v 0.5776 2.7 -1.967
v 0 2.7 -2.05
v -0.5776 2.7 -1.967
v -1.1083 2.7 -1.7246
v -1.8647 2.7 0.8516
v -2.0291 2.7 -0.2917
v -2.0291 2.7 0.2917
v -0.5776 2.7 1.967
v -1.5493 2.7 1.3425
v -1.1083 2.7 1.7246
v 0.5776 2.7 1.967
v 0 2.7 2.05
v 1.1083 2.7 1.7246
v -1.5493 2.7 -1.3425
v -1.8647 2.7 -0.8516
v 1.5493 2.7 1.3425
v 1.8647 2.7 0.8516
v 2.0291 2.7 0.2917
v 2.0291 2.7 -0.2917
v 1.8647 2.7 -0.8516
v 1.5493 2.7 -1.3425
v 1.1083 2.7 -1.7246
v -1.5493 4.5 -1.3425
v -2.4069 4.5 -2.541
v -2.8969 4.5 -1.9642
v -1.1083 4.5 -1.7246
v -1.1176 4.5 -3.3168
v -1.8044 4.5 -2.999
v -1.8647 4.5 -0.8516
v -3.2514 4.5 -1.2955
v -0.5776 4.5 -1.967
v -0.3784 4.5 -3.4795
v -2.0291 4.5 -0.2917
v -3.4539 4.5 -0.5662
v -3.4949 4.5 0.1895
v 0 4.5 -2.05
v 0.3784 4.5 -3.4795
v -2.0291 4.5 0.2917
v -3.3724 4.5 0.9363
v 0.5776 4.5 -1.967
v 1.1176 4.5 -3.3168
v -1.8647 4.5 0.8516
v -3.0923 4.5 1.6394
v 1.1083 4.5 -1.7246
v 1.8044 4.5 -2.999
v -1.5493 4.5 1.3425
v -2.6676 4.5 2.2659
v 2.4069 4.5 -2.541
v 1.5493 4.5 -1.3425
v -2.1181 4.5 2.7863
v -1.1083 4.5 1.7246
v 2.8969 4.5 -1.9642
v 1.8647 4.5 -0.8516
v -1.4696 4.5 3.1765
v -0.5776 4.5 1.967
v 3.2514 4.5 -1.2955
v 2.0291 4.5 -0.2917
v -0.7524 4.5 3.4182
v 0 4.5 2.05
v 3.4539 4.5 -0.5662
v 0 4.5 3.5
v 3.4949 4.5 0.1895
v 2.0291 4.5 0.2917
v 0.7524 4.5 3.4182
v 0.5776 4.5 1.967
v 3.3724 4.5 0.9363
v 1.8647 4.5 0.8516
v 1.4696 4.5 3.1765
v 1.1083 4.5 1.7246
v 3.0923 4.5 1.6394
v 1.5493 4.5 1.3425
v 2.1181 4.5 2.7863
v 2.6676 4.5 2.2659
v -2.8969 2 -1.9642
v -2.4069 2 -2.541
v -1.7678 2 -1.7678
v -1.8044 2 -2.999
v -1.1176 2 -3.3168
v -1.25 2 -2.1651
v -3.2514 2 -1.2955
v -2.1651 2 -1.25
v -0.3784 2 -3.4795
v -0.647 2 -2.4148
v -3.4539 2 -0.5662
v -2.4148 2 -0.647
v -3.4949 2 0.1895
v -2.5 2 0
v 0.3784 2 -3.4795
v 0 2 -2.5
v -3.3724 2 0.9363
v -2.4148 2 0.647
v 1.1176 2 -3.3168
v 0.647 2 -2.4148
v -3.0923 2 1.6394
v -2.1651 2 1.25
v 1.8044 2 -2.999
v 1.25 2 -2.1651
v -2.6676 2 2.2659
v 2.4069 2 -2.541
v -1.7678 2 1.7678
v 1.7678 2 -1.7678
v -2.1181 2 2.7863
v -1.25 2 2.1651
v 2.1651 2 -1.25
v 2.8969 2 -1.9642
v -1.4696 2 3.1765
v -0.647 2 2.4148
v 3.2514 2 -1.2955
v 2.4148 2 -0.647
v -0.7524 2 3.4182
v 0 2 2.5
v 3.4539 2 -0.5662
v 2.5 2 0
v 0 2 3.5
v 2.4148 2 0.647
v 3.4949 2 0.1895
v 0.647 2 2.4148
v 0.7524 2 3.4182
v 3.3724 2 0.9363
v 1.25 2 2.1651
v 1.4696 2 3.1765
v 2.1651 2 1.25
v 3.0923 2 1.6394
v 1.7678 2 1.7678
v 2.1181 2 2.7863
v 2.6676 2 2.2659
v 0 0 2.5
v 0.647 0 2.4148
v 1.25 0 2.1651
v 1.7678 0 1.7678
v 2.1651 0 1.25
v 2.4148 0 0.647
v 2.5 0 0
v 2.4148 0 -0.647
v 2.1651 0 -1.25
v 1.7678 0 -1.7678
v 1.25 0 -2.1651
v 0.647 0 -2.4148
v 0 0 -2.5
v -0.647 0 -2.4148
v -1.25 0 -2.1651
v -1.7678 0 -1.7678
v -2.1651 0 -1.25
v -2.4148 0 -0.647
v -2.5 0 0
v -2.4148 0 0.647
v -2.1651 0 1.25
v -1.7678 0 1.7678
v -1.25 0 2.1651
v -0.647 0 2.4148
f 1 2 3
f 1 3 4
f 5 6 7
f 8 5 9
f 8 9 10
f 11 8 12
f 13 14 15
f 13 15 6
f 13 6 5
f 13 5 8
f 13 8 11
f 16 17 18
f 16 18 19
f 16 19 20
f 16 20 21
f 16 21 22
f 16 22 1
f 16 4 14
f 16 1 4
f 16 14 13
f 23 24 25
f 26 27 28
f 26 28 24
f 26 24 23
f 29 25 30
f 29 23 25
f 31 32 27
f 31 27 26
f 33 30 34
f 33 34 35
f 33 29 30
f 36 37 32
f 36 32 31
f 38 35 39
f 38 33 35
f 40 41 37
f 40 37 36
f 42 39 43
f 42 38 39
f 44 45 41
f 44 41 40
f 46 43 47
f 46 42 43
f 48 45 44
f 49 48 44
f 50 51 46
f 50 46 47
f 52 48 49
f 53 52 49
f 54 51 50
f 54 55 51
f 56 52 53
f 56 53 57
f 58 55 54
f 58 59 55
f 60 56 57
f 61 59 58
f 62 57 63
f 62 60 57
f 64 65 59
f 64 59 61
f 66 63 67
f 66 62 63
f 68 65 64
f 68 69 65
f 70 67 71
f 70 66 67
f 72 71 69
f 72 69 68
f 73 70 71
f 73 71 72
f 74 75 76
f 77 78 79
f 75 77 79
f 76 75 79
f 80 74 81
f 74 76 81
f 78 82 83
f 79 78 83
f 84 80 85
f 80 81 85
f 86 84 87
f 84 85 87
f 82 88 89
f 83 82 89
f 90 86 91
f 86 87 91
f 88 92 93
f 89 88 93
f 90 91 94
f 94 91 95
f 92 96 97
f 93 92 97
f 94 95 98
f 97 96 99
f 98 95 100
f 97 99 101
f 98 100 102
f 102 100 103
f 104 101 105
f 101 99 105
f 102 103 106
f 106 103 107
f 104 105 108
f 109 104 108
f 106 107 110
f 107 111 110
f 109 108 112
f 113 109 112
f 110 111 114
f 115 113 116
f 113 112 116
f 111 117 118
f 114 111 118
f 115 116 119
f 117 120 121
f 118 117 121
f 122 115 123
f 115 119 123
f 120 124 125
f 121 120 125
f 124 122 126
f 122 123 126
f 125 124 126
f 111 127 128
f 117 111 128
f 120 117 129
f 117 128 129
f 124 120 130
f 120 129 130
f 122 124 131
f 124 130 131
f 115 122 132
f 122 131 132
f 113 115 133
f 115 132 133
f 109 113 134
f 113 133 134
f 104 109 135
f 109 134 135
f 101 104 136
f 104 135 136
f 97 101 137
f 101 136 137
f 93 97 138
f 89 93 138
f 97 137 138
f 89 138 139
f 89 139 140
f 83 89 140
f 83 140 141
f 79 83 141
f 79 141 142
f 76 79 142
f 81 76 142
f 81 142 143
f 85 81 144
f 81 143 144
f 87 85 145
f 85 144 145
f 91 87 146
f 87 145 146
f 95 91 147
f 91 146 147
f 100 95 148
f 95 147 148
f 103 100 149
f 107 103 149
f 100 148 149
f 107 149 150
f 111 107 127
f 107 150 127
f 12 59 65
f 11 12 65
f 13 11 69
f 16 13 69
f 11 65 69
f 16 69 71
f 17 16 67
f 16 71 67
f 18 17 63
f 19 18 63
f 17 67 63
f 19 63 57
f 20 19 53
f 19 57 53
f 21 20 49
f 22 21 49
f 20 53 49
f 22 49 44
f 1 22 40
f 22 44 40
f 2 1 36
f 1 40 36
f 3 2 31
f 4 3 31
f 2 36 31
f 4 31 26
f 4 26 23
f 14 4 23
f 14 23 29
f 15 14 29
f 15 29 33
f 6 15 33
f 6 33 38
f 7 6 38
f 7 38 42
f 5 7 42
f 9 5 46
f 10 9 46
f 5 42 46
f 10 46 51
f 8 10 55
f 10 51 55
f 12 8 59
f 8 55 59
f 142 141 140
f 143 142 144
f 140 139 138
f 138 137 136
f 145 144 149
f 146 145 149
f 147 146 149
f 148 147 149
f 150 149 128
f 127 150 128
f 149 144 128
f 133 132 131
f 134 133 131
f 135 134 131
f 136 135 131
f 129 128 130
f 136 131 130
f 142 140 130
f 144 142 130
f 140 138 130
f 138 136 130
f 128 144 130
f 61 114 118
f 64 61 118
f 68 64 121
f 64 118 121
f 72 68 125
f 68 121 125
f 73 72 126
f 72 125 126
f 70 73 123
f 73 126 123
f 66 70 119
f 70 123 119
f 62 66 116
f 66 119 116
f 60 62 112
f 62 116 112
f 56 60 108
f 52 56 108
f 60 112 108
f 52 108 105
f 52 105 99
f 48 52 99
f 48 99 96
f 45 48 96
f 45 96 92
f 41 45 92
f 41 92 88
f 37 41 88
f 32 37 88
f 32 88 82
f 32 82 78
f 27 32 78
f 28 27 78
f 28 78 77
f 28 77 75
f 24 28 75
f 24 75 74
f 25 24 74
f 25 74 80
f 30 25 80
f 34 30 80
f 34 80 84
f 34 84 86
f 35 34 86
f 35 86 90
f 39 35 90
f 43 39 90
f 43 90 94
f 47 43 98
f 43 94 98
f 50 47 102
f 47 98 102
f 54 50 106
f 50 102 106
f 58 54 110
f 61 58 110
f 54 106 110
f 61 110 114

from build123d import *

# Parameters (mm, degrees)
SKETCH1_R           = 2.5
BOSS_EXTRUDE2_DEPTH = 4.5
SKETCH1_3_R         = 3.5
SKETCH1_3_R_2       = 2.5
BOSS_EXTRUDE3_DEPTH = 4.5
SKETCH1_4_R         = 3.5
SKETCH1_4_R_2       = 2.5
CUT_EXTRUDE1_DEPTH  = 2
SKETCH2_R           = 2.05
CUT_EXTRUDE2_DEPTH  = 1.8


with BuildPart() as part:
    # Sketch1 → Boss-Extrude2 (new body)
    with BuildSketch(Plane(origin=(0, 0, 0), x_dir=(1, 0, 0), z_dir=(0, 1, 0))):
        with Locations(Location((0, 0, 0), (0, 0, 270))):
            Circle(SKETCH1_R)
    extrude(amount=BOSS_EXTRUDE2_DEPTH)

    # Sketch1<3> → Boss-Extrude3 (add)
    with BuildSketch(Plane(origin=(0, 0, 0), x_dir=(1, 0, 0), z_dir=(0, 1, 0))):
        with Locations(Location((0, 0, 0), (0, 0, 270))):
            Circle(SKETCH1_3_R)
        Circle(SKETCH1_3_R_2, mode=Mode.SUBTRACT)
    extrude(amount=BOSS_EXTRUDE3_DEPTH)

    # Sketch1<4> → Cut-Extrude1 (cut)
    with BuildSketch(Plane(origin=(0, 0, 0), x_dir=(1, 0, 0), z_dir=(0, 1, 0))):
        with Locations(Location((0, 0, 0), (0, 0, 270))):
            Circle(SKETCH1_4_R)
        with Locations(Location((0, 0, 0), (0, 0, 270))):
            Circle(SKETCH1_4_R_2, mode=Mode.SUBTRACT)
    extrude(amount=CUT_EXTRUDE1_DEPTH, mode=Mode.SUBTRACT)

    # Sketch2 → Cut-Extrude2 (cut)
    with BuildSketch(Plane(origin=(0, 4.5, 0), x_dir=(1, 0, 0), z_dir=(0, 1, 0))):
        with Locations(Location((0, 0, 0), (0, 0, 270))):
            Circle(SKETCH2_R)
    extrude(amount=-CUT_EXTRUDE2_DEPTH, mode=Mode.SUBTRACT)


solid = part.part
